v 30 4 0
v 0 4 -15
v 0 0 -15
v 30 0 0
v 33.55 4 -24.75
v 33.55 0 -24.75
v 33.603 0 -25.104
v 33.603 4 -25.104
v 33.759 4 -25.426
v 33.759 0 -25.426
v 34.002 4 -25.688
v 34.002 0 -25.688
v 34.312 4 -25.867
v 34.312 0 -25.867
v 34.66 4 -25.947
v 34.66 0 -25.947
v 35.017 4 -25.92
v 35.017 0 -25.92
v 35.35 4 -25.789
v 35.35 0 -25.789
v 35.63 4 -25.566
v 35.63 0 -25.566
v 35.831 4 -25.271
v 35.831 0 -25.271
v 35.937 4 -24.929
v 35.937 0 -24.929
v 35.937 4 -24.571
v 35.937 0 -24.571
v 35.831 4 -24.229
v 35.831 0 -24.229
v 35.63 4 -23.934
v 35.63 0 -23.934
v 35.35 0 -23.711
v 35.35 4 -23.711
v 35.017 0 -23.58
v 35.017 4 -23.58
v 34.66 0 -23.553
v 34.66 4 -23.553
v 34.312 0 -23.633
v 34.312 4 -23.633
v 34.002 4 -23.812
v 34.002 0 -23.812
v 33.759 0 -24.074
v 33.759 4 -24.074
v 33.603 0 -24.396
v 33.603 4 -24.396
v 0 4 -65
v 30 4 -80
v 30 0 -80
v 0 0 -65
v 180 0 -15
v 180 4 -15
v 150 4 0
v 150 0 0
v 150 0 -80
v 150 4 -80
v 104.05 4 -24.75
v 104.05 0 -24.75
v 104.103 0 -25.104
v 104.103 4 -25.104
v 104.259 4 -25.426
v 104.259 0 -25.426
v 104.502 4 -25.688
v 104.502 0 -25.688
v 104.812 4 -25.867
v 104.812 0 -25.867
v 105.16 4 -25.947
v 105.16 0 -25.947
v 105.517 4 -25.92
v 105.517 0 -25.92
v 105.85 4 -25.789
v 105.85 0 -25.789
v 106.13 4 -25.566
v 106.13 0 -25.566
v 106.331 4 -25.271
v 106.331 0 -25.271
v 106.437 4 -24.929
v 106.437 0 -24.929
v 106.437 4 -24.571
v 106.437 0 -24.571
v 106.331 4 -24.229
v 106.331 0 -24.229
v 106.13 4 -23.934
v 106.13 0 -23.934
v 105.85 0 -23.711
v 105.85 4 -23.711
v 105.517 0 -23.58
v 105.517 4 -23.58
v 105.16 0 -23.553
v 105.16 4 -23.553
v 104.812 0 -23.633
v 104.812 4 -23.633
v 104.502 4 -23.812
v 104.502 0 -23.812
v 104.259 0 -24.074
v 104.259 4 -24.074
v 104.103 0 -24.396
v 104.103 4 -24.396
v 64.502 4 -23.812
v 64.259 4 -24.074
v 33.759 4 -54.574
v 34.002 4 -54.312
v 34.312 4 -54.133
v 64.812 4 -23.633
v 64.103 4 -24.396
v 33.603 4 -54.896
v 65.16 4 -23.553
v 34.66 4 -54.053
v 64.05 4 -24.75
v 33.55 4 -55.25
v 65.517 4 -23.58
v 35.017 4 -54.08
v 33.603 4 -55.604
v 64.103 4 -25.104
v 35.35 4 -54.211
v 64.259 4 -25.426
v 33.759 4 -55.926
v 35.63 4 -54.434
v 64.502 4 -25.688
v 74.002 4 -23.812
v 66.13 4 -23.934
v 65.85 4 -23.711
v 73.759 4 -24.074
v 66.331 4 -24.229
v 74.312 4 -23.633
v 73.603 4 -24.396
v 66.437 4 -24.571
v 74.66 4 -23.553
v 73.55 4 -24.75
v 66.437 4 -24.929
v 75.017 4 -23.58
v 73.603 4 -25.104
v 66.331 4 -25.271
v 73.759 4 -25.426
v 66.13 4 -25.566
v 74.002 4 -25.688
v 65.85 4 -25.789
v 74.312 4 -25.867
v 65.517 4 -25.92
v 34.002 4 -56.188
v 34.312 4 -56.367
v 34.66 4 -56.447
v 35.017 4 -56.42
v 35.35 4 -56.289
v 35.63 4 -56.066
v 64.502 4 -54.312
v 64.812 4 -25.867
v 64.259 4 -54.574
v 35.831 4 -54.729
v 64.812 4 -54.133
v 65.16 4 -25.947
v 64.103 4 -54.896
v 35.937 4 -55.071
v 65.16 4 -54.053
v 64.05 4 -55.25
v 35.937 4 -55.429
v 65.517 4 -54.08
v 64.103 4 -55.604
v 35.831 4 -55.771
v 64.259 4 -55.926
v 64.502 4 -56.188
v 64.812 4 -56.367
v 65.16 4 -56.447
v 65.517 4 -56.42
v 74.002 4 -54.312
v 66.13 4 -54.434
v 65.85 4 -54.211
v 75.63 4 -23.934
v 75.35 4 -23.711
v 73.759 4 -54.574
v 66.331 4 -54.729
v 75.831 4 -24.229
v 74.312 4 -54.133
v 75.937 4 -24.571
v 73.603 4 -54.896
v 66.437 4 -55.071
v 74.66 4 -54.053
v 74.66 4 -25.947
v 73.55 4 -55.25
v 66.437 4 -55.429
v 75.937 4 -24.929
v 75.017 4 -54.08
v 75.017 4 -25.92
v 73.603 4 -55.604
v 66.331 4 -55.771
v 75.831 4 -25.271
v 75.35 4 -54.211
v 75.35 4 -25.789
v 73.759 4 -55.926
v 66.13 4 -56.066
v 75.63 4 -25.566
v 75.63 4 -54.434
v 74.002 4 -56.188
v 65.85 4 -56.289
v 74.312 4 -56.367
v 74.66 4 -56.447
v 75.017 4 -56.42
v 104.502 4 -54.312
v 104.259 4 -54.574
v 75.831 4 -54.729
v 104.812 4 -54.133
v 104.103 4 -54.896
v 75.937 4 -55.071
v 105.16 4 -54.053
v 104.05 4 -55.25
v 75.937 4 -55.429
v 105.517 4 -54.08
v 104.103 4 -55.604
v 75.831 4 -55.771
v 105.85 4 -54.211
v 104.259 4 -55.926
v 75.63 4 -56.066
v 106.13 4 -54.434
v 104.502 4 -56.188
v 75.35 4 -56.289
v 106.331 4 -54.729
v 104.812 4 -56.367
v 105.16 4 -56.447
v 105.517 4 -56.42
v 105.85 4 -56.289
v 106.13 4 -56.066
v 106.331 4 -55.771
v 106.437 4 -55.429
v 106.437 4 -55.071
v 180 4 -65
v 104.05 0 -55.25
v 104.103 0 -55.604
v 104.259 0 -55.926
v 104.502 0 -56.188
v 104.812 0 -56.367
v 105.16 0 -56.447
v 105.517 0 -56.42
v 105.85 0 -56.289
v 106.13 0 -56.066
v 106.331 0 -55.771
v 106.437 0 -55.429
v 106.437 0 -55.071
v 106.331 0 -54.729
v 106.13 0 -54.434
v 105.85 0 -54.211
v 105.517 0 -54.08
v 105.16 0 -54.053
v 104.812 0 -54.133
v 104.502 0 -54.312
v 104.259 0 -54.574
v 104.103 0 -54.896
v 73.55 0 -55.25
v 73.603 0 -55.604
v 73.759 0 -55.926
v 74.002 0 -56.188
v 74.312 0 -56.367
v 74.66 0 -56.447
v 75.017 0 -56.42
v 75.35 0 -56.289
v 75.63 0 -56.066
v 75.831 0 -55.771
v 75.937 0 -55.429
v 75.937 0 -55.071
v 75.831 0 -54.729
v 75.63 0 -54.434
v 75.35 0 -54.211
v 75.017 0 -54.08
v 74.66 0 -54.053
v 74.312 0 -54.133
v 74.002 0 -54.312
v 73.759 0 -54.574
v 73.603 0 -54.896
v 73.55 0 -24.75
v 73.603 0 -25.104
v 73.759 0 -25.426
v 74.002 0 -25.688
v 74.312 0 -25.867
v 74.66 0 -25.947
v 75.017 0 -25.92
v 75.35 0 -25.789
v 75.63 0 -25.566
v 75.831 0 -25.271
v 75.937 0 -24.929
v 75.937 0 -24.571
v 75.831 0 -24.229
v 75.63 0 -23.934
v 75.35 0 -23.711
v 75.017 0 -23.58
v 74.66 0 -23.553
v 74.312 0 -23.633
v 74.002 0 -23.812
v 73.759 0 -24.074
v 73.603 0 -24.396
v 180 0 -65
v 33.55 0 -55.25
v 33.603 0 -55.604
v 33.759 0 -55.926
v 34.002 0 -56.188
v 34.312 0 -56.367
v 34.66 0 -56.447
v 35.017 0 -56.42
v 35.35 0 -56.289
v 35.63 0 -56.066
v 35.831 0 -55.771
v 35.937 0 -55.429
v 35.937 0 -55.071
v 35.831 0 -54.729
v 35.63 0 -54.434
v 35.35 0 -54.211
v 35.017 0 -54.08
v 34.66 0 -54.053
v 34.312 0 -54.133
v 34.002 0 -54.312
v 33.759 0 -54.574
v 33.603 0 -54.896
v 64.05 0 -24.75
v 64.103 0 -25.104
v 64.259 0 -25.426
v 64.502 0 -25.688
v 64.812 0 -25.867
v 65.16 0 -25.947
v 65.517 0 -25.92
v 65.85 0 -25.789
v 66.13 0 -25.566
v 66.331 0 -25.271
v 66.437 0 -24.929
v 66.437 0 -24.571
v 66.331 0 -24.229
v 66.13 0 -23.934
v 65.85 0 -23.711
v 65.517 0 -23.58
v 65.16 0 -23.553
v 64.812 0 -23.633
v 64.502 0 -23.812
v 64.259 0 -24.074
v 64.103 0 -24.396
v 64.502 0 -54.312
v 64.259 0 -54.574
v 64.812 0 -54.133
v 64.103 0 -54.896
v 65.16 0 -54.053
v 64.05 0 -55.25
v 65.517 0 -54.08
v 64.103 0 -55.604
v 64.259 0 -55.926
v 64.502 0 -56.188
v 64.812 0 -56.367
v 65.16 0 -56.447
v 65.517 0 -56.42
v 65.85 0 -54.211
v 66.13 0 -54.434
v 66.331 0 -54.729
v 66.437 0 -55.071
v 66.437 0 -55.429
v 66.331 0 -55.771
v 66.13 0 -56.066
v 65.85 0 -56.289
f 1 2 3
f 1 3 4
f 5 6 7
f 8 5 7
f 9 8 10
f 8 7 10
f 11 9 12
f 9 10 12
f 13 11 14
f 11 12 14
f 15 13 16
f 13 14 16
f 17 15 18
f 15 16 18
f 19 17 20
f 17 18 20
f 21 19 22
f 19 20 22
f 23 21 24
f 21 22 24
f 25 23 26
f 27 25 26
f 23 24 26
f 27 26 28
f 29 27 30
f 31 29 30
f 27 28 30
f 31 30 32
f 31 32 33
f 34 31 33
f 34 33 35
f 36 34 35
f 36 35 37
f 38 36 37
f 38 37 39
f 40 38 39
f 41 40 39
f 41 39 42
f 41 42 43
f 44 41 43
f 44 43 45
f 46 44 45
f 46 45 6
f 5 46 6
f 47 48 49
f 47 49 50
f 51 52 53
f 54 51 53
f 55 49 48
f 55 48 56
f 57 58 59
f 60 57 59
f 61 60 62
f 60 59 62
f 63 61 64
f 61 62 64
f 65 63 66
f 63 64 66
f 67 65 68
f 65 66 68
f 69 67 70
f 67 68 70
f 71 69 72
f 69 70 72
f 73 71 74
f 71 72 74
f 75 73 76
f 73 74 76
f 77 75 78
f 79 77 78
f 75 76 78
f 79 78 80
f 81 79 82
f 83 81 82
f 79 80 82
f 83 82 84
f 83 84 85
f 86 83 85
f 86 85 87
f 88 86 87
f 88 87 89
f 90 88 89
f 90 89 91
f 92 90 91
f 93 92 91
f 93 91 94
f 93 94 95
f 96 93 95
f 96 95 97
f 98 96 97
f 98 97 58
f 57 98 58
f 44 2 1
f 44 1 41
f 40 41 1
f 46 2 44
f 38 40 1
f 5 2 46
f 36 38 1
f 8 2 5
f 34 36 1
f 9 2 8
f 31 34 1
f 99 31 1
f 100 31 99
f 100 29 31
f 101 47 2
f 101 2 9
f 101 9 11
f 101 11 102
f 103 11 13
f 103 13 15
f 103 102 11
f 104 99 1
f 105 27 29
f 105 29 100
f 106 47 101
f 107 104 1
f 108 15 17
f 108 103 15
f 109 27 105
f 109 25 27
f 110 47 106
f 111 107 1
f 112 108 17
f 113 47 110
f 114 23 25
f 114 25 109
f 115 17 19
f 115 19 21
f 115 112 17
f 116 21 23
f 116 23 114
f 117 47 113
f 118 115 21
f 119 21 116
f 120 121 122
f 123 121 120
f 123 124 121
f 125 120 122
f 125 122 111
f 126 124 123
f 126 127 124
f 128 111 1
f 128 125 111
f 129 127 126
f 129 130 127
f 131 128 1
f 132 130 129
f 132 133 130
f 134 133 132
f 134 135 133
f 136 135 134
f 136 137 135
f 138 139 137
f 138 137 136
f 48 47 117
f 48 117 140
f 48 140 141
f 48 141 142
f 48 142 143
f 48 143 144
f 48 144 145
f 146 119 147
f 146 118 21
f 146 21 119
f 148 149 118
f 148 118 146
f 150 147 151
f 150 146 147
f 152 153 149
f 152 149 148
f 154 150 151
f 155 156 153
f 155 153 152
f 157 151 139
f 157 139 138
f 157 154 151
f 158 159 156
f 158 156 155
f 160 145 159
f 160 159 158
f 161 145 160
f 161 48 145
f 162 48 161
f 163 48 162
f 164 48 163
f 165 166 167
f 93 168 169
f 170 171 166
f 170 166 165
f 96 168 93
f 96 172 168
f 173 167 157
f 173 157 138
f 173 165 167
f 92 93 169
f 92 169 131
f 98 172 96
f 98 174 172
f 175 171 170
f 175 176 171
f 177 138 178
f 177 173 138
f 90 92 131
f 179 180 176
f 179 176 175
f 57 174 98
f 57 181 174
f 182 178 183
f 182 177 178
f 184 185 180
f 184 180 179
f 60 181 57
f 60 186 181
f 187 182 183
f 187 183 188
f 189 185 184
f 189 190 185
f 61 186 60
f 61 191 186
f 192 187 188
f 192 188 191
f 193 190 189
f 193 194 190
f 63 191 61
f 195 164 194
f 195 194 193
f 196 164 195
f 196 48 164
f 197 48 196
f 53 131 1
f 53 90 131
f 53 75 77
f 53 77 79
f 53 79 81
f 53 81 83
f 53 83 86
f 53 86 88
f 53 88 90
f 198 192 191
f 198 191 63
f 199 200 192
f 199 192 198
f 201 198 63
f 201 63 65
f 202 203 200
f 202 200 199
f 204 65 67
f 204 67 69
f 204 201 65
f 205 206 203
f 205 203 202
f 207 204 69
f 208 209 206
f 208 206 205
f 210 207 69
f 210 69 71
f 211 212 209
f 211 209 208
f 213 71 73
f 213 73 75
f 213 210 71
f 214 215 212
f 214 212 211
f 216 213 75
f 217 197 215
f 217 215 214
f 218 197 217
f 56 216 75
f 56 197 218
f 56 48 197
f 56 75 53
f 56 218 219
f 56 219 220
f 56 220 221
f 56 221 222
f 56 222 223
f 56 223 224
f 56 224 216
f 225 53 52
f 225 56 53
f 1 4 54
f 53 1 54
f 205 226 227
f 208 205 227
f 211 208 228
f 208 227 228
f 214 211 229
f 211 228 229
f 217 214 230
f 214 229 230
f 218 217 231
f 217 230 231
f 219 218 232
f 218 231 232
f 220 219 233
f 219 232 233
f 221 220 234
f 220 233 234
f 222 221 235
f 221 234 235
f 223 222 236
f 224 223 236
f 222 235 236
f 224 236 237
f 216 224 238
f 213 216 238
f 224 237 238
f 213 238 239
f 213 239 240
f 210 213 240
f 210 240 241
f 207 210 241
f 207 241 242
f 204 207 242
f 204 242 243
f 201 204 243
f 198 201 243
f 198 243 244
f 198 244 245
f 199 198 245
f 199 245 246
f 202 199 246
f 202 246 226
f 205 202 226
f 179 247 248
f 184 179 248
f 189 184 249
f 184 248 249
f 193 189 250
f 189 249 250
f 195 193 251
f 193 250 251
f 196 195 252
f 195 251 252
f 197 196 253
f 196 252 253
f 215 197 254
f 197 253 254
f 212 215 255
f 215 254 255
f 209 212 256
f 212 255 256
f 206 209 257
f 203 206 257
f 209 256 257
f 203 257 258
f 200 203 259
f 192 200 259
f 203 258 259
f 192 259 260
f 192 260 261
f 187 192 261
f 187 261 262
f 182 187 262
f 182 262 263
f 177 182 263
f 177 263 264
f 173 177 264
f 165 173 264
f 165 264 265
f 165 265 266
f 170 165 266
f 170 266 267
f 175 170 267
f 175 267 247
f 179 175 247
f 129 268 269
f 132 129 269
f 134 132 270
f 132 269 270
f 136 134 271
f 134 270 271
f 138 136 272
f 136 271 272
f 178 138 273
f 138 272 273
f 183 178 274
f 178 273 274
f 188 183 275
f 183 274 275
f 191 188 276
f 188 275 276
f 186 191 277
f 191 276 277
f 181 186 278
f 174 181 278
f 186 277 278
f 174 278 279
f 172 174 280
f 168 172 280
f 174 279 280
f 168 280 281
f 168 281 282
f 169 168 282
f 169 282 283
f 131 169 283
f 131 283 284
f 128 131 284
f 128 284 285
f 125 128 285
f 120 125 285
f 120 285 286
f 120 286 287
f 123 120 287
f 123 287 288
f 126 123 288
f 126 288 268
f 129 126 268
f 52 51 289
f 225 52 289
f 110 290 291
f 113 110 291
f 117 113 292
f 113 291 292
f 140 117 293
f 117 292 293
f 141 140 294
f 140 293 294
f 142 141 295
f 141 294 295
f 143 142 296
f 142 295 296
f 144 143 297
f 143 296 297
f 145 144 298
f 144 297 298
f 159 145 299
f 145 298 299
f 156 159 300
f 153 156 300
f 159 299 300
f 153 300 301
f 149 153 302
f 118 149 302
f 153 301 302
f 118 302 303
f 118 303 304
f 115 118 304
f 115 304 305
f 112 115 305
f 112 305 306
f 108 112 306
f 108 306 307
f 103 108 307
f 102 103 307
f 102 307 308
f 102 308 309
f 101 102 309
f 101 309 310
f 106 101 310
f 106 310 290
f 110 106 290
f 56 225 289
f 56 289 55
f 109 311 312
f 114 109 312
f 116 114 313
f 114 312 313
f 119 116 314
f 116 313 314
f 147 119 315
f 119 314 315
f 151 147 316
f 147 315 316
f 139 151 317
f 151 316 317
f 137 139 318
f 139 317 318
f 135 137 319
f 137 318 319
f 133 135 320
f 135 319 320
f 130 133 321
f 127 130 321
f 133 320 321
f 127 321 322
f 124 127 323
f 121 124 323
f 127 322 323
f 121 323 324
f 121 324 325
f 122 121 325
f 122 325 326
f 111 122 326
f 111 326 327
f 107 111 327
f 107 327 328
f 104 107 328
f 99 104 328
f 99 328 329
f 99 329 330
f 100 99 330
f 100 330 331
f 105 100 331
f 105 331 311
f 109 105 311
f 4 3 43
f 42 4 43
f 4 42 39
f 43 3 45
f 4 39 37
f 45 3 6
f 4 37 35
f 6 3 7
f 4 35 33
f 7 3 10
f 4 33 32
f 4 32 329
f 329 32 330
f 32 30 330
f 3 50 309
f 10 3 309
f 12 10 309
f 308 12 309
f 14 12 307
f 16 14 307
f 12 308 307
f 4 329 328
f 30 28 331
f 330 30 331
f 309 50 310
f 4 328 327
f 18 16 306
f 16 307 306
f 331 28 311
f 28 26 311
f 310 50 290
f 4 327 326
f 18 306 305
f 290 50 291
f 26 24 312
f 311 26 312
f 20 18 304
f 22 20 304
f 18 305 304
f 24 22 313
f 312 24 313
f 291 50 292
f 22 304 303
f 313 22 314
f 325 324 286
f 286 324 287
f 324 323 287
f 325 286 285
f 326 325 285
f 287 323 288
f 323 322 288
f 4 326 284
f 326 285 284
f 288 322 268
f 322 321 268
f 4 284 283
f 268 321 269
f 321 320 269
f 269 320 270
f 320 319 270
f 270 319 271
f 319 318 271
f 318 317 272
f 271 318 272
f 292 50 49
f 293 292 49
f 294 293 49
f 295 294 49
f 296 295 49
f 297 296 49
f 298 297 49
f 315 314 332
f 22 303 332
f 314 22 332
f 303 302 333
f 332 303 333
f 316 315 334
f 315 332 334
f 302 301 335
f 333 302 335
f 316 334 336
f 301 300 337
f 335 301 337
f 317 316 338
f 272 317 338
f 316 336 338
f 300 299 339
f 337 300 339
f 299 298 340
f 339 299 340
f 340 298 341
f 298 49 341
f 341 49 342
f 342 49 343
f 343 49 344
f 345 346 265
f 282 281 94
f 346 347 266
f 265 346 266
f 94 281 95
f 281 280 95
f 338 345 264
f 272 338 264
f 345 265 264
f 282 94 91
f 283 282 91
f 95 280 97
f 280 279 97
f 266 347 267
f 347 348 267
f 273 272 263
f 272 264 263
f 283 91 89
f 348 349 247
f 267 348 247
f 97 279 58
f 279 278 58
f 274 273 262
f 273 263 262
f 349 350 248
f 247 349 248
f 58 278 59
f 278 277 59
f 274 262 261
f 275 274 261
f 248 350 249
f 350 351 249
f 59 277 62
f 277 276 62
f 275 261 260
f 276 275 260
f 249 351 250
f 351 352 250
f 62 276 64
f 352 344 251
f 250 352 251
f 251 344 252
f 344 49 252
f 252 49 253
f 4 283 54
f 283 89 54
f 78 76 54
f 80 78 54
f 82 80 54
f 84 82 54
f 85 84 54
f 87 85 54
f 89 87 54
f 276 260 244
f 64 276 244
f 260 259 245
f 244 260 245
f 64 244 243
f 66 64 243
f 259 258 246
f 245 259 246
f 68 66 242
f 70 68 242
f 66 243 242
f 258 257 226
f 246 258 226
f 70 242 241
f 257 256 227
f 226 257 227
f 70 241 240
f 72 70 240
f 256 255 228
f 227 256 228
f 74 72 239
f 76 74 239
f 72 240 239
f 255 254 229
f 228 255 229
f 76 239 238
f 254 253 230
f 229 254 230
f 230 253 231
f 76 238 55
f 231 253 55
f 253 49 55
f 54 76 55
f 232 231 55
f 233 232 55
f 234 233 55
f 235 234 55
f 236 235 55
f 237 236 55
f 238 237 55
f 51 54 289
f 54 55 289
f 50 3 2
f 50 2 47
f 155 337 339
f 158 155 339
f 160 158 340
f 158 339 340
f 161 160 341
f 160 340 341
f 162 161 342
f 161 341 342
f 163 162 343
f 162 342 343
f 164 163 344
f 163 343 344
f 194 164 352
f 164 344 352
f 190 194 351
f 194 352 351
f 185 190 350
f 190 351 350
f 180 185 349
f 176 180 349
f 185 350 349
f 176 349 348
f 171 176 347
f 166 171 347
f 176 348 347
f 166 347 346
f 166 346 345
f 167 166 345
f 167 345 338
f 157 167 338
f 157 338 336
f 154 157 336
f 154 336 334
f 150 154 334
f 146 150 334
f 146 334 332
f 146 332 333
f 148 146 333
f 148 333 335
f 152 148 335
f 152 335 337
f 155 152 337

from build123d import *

# Parameters (mm, degrees)
ESQUISSE1_W             = 180
ESQUISSE1_H             = 80
BOSS_EXTRU_1_DEPTH      = 4
ENL_V_MAT_EXTRU_1_DEPTH = 4
D_GAGEMENT_M22_D        = 2.4
D_GAGEMENT_M23_D        = 2.4


with BuildPart() as part:
    # Esquisse1 → Boss.-Extru.1 (new body)
    with BuildSketch(Plane(origin=(0, 0, 0), x_dir=(1, 0, 0), z_dir=(0, 1, 0))):
        with Locations((90, 40)):
            Rectangle(ESQUISSE1_W, ESQUISSE1_H)
    extrude(amount=BOSS_EXTRU_1_DEPTH)

    # Esquisse2 → Enlèv. mat.-Extru.1 (cut)
    with BuildSketch(Plane(origin=(0, 4, 0), x_dir=(1, 0, 0), z_dir=(0, 1, 0))):
        Polygon((0, 15), (30, 0), (0, 0), align=None)
        Polygon((30, 80), (0, 65), (0, 80), align=None)
        Polygon((150, 80), (180, 80), (180, 65), align=None)
        Polygon((180, 15), (150, 0), (180, 0), align=None)
    extrude(amount=-ENL_V_MAT_EXTRU_1_DEPTH, mode=Mode.SUBTRACT)

    # Dégagement M22 (through all)
    with Locations(Plane(origin=(0, 4, 0), x_dir=(1, 0, 0), z_dir=(0, 1, 0))):
        with Locations((74.75, 55.25), (105.25, 55.25), (105.25, 24.75), (74.75, 24.75)):
            Hole(D_GAGEMENT_M22_D / 2)

    # Dégagement M23 (through all)
    with Locations(Plane(origin=(0, 4, 0), x_dir=(1, 0, 0), z_dir=(0, 1, 0))):
        with Locations((34.75, 24.75), (65.25, 24.75), (65.25, 55.25), (34.75, 55.25)):
            Hole(D_GAGEMENT_M23_D / 2)


solid = part.part
